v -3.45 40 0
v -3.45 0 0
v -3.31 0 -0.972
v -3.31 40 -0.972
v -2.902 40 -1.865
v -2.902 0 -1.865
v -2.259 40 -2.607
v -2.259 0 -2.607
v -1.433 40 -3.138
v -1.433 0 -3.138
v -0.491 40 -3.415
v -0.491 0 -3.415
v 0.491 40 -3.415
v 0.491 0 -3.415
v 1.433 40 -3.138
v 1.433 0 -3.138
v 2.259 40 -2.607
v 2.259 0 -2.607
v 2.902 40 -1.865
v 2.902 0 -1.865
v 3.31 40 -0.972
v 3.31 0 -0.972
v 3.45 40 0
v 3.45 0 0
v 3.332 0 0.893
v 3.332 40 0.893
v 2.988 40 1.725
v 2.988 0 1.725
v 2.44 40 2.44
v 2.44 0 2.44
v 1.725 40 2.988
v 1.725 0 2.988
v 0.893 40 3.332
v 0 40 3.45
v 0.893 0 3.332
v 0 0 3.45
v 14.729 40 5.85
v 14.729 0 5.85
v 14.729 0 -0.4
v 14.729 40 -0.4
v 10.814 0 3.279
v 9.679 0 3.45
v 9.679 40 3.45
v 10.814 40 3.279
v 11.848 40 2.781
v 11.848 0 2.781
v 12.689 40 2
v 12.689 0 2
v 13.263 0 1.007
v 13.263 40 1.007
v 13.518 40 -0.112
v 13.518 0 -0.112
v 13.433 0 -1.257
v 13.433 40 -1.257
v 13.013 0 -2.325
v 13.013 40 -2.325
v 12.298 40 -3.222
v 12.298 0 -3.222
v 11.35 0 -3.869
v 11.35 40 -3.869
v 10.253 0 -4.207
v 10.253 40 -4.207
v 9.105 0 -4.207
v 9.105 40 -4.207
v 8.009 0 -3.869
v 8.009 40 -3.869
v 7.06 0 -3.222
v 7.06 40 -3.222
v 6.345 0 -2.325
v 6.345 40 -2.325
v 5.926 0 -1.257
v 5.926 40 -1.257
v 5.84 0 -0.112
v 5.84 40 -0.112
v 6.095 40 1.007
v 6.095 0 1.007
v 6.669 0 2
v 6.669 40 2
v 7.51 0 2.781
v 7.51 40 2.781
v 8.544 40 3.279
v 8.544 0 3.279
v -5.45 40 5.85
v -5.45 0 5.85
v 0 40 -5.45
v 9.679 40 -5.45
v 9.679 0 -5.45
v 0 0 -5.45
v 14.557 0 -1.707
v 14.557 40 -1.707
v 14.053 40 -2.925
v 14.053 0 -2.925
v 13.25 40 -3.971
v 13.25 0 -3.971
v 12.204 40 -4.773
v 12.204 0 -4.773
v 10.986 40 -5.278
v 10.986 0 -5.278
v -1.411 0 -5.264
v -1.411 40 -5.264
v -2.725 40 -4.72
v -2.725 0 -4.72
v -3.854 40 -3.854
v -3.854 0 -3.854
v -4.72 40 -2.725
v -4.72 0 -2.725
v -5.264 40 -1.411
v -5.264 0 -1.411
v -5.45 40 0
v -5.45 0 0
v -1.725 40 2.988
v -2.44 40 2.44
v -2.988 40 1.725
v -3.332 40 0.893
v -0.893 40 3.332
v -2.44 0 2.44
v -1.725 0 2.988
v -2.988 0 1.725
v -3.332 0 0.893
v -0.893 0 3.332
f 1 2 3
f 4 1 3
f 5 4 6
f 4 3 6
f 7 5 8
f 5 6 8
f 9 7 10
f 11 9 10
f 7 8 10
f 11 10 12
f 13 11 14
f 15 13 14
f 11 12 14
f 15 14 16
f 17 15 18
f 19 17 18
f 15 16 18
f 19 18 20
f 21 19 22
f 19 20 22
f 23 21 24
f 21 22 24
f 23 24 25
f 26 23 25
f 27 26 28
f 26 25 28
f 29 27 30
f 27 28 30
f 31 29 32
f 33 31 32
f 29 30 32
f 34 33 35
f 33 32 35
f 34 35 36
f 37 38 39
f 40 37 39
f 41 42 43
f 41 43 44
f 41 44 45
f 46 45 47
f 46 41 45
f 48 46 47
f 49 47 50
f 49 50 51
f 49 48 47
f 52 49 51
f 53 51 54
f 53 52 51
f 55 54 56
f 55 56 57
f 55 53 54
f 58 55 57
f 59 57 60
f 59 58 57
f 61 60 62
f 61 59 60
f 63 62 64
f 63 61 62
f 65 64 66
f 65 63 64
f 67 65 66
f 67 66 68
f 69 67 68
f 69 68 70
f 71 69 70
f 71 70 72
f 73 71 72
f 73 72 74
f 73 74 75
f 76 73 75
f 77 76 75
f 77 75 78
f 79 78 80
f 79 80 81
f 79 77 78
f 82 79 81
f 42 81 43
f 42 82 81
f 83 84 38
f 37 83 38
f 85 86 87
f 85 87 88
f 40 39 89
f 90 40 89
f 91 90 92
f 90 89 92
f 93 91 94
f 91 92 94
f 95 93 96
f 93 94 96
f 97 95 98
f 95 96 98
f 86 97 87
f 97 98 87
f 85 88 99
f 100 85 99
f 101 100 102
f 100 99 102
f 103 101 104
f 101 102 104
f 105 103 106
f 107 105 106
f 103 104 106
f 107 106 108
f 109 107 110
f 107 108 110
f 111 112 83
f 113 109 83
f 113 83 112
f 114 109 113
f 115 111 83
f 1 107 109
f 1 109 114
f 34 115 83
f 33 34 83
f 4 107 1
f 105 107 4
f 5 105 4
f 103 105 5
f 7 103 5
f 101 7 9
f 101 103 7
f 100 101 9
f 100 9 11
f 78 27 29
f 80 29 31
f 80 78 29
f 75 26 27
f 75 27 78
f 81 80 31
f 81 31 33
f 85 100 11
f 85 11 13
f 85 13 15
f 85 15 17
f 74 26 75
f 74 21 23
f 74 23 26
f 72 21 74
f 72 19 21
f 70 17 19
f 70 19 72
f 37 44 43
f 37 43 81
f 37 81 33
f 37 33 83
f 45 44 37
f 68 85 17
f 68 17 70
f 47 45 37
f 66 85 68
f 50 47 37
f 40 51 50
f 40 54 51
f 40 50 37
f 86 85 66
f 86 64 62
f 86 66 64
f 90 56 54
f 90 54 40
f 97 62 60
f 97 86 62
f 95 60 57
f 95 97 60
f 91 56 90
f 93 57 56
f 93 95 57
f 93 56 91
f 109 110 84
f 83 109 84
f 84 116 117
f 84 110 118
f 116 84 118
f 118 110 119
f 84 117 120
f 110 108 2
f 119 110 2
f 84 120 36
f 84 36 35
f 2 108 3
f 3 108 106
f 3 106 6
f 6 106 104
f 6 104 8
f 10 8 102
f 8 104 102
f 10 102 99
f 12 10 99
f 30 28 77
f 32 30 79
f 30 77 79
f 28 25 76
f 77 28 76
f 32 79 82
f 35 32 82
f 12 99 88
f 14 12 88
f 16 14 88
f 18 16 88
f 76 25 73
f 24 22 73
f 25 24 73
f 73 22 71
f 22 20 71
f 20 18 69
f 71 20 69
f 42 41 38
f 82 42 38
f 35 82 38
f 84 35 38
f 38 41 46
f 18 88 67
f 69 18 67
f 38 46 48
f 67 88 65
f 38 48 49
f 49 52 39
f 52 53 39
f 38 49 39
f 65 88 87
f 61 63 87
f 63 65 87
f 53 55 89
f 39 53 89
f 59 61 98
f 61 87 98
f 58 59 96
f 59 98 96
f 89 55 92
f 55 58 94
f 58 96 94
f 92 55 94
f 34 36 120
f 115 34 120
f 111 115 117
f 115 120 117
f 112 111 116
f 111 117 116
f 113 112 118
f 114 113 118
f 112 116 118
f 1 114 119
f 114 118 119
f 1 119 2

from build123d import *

# Parameters (mm, degrees)
SKETCH1_R           = 3.85
BOSS_EXTRUDE2_DEPTH = 40


with BuildPart() as part:
    # Sketch1 → Boss-Extrude2 (new body)
    # profile 1 of 2: a face of its own
    with BuildSketch(Plane(origin=(0, 0, 0), x_dir=(1, 0, 0), z_dir=(0, 1, 0))):
        with BuildLine():
            ThreePointArc((0, 5.45), (-3.853731957, 3.853731957), (-5.45, 0))
            Line((-5.45, 0), (-3.45, 0))
            ThreePointArc((-3.45, 0), (0, 3.45), (3.45, 0))
            ThreePointArc((3.45, 0), (2.439518395, -2.439518395), (0, -3.45))
            Line((0, -3.45), (0, -5.85))
            Line((0, -5.85), (5.45, -5.85))
            Line((5.45, -5.85), (14.7291644, -5.85))
            Line((14.7291644, -5.85), (14.7291644, 0.4))
            ThreePointArc((14.7291644, 0.4), (13.250053645, 3.970889245), (9.6791644, 5.45))
            Line((9.6791644, 5.45), (0, 5.45))
        make_face()
        with Locations(Location((9.6791644, 0.4, 0), (0, 0, 270))):
            Circle(SKETCH1_R, mode=Mode.SUBTRACT)
    # profile 2 of 2: a face of its own
    with BuildSketch(Plane(origin=(0, 0, 0), x_dir=(1, 0, 0), z_dir=(0, 1, 0))):
        with BuildLine():
            Line((-3.45, 0), (-5.45, 0))
            Line((-5.45, 0), (-5.45, -5.85))
            Line((-5.45, -5.85), (0, -5.85))
            Line((0, -5.85), (0, -3.45))
            ThreePointArc((0, -3.45), (-2.439518395, -2.439518395), (-3.45, 0))
        make_face()
    extrude(amount=BOSS_EXTRUDE2_DEPTH)


solid = part.part
